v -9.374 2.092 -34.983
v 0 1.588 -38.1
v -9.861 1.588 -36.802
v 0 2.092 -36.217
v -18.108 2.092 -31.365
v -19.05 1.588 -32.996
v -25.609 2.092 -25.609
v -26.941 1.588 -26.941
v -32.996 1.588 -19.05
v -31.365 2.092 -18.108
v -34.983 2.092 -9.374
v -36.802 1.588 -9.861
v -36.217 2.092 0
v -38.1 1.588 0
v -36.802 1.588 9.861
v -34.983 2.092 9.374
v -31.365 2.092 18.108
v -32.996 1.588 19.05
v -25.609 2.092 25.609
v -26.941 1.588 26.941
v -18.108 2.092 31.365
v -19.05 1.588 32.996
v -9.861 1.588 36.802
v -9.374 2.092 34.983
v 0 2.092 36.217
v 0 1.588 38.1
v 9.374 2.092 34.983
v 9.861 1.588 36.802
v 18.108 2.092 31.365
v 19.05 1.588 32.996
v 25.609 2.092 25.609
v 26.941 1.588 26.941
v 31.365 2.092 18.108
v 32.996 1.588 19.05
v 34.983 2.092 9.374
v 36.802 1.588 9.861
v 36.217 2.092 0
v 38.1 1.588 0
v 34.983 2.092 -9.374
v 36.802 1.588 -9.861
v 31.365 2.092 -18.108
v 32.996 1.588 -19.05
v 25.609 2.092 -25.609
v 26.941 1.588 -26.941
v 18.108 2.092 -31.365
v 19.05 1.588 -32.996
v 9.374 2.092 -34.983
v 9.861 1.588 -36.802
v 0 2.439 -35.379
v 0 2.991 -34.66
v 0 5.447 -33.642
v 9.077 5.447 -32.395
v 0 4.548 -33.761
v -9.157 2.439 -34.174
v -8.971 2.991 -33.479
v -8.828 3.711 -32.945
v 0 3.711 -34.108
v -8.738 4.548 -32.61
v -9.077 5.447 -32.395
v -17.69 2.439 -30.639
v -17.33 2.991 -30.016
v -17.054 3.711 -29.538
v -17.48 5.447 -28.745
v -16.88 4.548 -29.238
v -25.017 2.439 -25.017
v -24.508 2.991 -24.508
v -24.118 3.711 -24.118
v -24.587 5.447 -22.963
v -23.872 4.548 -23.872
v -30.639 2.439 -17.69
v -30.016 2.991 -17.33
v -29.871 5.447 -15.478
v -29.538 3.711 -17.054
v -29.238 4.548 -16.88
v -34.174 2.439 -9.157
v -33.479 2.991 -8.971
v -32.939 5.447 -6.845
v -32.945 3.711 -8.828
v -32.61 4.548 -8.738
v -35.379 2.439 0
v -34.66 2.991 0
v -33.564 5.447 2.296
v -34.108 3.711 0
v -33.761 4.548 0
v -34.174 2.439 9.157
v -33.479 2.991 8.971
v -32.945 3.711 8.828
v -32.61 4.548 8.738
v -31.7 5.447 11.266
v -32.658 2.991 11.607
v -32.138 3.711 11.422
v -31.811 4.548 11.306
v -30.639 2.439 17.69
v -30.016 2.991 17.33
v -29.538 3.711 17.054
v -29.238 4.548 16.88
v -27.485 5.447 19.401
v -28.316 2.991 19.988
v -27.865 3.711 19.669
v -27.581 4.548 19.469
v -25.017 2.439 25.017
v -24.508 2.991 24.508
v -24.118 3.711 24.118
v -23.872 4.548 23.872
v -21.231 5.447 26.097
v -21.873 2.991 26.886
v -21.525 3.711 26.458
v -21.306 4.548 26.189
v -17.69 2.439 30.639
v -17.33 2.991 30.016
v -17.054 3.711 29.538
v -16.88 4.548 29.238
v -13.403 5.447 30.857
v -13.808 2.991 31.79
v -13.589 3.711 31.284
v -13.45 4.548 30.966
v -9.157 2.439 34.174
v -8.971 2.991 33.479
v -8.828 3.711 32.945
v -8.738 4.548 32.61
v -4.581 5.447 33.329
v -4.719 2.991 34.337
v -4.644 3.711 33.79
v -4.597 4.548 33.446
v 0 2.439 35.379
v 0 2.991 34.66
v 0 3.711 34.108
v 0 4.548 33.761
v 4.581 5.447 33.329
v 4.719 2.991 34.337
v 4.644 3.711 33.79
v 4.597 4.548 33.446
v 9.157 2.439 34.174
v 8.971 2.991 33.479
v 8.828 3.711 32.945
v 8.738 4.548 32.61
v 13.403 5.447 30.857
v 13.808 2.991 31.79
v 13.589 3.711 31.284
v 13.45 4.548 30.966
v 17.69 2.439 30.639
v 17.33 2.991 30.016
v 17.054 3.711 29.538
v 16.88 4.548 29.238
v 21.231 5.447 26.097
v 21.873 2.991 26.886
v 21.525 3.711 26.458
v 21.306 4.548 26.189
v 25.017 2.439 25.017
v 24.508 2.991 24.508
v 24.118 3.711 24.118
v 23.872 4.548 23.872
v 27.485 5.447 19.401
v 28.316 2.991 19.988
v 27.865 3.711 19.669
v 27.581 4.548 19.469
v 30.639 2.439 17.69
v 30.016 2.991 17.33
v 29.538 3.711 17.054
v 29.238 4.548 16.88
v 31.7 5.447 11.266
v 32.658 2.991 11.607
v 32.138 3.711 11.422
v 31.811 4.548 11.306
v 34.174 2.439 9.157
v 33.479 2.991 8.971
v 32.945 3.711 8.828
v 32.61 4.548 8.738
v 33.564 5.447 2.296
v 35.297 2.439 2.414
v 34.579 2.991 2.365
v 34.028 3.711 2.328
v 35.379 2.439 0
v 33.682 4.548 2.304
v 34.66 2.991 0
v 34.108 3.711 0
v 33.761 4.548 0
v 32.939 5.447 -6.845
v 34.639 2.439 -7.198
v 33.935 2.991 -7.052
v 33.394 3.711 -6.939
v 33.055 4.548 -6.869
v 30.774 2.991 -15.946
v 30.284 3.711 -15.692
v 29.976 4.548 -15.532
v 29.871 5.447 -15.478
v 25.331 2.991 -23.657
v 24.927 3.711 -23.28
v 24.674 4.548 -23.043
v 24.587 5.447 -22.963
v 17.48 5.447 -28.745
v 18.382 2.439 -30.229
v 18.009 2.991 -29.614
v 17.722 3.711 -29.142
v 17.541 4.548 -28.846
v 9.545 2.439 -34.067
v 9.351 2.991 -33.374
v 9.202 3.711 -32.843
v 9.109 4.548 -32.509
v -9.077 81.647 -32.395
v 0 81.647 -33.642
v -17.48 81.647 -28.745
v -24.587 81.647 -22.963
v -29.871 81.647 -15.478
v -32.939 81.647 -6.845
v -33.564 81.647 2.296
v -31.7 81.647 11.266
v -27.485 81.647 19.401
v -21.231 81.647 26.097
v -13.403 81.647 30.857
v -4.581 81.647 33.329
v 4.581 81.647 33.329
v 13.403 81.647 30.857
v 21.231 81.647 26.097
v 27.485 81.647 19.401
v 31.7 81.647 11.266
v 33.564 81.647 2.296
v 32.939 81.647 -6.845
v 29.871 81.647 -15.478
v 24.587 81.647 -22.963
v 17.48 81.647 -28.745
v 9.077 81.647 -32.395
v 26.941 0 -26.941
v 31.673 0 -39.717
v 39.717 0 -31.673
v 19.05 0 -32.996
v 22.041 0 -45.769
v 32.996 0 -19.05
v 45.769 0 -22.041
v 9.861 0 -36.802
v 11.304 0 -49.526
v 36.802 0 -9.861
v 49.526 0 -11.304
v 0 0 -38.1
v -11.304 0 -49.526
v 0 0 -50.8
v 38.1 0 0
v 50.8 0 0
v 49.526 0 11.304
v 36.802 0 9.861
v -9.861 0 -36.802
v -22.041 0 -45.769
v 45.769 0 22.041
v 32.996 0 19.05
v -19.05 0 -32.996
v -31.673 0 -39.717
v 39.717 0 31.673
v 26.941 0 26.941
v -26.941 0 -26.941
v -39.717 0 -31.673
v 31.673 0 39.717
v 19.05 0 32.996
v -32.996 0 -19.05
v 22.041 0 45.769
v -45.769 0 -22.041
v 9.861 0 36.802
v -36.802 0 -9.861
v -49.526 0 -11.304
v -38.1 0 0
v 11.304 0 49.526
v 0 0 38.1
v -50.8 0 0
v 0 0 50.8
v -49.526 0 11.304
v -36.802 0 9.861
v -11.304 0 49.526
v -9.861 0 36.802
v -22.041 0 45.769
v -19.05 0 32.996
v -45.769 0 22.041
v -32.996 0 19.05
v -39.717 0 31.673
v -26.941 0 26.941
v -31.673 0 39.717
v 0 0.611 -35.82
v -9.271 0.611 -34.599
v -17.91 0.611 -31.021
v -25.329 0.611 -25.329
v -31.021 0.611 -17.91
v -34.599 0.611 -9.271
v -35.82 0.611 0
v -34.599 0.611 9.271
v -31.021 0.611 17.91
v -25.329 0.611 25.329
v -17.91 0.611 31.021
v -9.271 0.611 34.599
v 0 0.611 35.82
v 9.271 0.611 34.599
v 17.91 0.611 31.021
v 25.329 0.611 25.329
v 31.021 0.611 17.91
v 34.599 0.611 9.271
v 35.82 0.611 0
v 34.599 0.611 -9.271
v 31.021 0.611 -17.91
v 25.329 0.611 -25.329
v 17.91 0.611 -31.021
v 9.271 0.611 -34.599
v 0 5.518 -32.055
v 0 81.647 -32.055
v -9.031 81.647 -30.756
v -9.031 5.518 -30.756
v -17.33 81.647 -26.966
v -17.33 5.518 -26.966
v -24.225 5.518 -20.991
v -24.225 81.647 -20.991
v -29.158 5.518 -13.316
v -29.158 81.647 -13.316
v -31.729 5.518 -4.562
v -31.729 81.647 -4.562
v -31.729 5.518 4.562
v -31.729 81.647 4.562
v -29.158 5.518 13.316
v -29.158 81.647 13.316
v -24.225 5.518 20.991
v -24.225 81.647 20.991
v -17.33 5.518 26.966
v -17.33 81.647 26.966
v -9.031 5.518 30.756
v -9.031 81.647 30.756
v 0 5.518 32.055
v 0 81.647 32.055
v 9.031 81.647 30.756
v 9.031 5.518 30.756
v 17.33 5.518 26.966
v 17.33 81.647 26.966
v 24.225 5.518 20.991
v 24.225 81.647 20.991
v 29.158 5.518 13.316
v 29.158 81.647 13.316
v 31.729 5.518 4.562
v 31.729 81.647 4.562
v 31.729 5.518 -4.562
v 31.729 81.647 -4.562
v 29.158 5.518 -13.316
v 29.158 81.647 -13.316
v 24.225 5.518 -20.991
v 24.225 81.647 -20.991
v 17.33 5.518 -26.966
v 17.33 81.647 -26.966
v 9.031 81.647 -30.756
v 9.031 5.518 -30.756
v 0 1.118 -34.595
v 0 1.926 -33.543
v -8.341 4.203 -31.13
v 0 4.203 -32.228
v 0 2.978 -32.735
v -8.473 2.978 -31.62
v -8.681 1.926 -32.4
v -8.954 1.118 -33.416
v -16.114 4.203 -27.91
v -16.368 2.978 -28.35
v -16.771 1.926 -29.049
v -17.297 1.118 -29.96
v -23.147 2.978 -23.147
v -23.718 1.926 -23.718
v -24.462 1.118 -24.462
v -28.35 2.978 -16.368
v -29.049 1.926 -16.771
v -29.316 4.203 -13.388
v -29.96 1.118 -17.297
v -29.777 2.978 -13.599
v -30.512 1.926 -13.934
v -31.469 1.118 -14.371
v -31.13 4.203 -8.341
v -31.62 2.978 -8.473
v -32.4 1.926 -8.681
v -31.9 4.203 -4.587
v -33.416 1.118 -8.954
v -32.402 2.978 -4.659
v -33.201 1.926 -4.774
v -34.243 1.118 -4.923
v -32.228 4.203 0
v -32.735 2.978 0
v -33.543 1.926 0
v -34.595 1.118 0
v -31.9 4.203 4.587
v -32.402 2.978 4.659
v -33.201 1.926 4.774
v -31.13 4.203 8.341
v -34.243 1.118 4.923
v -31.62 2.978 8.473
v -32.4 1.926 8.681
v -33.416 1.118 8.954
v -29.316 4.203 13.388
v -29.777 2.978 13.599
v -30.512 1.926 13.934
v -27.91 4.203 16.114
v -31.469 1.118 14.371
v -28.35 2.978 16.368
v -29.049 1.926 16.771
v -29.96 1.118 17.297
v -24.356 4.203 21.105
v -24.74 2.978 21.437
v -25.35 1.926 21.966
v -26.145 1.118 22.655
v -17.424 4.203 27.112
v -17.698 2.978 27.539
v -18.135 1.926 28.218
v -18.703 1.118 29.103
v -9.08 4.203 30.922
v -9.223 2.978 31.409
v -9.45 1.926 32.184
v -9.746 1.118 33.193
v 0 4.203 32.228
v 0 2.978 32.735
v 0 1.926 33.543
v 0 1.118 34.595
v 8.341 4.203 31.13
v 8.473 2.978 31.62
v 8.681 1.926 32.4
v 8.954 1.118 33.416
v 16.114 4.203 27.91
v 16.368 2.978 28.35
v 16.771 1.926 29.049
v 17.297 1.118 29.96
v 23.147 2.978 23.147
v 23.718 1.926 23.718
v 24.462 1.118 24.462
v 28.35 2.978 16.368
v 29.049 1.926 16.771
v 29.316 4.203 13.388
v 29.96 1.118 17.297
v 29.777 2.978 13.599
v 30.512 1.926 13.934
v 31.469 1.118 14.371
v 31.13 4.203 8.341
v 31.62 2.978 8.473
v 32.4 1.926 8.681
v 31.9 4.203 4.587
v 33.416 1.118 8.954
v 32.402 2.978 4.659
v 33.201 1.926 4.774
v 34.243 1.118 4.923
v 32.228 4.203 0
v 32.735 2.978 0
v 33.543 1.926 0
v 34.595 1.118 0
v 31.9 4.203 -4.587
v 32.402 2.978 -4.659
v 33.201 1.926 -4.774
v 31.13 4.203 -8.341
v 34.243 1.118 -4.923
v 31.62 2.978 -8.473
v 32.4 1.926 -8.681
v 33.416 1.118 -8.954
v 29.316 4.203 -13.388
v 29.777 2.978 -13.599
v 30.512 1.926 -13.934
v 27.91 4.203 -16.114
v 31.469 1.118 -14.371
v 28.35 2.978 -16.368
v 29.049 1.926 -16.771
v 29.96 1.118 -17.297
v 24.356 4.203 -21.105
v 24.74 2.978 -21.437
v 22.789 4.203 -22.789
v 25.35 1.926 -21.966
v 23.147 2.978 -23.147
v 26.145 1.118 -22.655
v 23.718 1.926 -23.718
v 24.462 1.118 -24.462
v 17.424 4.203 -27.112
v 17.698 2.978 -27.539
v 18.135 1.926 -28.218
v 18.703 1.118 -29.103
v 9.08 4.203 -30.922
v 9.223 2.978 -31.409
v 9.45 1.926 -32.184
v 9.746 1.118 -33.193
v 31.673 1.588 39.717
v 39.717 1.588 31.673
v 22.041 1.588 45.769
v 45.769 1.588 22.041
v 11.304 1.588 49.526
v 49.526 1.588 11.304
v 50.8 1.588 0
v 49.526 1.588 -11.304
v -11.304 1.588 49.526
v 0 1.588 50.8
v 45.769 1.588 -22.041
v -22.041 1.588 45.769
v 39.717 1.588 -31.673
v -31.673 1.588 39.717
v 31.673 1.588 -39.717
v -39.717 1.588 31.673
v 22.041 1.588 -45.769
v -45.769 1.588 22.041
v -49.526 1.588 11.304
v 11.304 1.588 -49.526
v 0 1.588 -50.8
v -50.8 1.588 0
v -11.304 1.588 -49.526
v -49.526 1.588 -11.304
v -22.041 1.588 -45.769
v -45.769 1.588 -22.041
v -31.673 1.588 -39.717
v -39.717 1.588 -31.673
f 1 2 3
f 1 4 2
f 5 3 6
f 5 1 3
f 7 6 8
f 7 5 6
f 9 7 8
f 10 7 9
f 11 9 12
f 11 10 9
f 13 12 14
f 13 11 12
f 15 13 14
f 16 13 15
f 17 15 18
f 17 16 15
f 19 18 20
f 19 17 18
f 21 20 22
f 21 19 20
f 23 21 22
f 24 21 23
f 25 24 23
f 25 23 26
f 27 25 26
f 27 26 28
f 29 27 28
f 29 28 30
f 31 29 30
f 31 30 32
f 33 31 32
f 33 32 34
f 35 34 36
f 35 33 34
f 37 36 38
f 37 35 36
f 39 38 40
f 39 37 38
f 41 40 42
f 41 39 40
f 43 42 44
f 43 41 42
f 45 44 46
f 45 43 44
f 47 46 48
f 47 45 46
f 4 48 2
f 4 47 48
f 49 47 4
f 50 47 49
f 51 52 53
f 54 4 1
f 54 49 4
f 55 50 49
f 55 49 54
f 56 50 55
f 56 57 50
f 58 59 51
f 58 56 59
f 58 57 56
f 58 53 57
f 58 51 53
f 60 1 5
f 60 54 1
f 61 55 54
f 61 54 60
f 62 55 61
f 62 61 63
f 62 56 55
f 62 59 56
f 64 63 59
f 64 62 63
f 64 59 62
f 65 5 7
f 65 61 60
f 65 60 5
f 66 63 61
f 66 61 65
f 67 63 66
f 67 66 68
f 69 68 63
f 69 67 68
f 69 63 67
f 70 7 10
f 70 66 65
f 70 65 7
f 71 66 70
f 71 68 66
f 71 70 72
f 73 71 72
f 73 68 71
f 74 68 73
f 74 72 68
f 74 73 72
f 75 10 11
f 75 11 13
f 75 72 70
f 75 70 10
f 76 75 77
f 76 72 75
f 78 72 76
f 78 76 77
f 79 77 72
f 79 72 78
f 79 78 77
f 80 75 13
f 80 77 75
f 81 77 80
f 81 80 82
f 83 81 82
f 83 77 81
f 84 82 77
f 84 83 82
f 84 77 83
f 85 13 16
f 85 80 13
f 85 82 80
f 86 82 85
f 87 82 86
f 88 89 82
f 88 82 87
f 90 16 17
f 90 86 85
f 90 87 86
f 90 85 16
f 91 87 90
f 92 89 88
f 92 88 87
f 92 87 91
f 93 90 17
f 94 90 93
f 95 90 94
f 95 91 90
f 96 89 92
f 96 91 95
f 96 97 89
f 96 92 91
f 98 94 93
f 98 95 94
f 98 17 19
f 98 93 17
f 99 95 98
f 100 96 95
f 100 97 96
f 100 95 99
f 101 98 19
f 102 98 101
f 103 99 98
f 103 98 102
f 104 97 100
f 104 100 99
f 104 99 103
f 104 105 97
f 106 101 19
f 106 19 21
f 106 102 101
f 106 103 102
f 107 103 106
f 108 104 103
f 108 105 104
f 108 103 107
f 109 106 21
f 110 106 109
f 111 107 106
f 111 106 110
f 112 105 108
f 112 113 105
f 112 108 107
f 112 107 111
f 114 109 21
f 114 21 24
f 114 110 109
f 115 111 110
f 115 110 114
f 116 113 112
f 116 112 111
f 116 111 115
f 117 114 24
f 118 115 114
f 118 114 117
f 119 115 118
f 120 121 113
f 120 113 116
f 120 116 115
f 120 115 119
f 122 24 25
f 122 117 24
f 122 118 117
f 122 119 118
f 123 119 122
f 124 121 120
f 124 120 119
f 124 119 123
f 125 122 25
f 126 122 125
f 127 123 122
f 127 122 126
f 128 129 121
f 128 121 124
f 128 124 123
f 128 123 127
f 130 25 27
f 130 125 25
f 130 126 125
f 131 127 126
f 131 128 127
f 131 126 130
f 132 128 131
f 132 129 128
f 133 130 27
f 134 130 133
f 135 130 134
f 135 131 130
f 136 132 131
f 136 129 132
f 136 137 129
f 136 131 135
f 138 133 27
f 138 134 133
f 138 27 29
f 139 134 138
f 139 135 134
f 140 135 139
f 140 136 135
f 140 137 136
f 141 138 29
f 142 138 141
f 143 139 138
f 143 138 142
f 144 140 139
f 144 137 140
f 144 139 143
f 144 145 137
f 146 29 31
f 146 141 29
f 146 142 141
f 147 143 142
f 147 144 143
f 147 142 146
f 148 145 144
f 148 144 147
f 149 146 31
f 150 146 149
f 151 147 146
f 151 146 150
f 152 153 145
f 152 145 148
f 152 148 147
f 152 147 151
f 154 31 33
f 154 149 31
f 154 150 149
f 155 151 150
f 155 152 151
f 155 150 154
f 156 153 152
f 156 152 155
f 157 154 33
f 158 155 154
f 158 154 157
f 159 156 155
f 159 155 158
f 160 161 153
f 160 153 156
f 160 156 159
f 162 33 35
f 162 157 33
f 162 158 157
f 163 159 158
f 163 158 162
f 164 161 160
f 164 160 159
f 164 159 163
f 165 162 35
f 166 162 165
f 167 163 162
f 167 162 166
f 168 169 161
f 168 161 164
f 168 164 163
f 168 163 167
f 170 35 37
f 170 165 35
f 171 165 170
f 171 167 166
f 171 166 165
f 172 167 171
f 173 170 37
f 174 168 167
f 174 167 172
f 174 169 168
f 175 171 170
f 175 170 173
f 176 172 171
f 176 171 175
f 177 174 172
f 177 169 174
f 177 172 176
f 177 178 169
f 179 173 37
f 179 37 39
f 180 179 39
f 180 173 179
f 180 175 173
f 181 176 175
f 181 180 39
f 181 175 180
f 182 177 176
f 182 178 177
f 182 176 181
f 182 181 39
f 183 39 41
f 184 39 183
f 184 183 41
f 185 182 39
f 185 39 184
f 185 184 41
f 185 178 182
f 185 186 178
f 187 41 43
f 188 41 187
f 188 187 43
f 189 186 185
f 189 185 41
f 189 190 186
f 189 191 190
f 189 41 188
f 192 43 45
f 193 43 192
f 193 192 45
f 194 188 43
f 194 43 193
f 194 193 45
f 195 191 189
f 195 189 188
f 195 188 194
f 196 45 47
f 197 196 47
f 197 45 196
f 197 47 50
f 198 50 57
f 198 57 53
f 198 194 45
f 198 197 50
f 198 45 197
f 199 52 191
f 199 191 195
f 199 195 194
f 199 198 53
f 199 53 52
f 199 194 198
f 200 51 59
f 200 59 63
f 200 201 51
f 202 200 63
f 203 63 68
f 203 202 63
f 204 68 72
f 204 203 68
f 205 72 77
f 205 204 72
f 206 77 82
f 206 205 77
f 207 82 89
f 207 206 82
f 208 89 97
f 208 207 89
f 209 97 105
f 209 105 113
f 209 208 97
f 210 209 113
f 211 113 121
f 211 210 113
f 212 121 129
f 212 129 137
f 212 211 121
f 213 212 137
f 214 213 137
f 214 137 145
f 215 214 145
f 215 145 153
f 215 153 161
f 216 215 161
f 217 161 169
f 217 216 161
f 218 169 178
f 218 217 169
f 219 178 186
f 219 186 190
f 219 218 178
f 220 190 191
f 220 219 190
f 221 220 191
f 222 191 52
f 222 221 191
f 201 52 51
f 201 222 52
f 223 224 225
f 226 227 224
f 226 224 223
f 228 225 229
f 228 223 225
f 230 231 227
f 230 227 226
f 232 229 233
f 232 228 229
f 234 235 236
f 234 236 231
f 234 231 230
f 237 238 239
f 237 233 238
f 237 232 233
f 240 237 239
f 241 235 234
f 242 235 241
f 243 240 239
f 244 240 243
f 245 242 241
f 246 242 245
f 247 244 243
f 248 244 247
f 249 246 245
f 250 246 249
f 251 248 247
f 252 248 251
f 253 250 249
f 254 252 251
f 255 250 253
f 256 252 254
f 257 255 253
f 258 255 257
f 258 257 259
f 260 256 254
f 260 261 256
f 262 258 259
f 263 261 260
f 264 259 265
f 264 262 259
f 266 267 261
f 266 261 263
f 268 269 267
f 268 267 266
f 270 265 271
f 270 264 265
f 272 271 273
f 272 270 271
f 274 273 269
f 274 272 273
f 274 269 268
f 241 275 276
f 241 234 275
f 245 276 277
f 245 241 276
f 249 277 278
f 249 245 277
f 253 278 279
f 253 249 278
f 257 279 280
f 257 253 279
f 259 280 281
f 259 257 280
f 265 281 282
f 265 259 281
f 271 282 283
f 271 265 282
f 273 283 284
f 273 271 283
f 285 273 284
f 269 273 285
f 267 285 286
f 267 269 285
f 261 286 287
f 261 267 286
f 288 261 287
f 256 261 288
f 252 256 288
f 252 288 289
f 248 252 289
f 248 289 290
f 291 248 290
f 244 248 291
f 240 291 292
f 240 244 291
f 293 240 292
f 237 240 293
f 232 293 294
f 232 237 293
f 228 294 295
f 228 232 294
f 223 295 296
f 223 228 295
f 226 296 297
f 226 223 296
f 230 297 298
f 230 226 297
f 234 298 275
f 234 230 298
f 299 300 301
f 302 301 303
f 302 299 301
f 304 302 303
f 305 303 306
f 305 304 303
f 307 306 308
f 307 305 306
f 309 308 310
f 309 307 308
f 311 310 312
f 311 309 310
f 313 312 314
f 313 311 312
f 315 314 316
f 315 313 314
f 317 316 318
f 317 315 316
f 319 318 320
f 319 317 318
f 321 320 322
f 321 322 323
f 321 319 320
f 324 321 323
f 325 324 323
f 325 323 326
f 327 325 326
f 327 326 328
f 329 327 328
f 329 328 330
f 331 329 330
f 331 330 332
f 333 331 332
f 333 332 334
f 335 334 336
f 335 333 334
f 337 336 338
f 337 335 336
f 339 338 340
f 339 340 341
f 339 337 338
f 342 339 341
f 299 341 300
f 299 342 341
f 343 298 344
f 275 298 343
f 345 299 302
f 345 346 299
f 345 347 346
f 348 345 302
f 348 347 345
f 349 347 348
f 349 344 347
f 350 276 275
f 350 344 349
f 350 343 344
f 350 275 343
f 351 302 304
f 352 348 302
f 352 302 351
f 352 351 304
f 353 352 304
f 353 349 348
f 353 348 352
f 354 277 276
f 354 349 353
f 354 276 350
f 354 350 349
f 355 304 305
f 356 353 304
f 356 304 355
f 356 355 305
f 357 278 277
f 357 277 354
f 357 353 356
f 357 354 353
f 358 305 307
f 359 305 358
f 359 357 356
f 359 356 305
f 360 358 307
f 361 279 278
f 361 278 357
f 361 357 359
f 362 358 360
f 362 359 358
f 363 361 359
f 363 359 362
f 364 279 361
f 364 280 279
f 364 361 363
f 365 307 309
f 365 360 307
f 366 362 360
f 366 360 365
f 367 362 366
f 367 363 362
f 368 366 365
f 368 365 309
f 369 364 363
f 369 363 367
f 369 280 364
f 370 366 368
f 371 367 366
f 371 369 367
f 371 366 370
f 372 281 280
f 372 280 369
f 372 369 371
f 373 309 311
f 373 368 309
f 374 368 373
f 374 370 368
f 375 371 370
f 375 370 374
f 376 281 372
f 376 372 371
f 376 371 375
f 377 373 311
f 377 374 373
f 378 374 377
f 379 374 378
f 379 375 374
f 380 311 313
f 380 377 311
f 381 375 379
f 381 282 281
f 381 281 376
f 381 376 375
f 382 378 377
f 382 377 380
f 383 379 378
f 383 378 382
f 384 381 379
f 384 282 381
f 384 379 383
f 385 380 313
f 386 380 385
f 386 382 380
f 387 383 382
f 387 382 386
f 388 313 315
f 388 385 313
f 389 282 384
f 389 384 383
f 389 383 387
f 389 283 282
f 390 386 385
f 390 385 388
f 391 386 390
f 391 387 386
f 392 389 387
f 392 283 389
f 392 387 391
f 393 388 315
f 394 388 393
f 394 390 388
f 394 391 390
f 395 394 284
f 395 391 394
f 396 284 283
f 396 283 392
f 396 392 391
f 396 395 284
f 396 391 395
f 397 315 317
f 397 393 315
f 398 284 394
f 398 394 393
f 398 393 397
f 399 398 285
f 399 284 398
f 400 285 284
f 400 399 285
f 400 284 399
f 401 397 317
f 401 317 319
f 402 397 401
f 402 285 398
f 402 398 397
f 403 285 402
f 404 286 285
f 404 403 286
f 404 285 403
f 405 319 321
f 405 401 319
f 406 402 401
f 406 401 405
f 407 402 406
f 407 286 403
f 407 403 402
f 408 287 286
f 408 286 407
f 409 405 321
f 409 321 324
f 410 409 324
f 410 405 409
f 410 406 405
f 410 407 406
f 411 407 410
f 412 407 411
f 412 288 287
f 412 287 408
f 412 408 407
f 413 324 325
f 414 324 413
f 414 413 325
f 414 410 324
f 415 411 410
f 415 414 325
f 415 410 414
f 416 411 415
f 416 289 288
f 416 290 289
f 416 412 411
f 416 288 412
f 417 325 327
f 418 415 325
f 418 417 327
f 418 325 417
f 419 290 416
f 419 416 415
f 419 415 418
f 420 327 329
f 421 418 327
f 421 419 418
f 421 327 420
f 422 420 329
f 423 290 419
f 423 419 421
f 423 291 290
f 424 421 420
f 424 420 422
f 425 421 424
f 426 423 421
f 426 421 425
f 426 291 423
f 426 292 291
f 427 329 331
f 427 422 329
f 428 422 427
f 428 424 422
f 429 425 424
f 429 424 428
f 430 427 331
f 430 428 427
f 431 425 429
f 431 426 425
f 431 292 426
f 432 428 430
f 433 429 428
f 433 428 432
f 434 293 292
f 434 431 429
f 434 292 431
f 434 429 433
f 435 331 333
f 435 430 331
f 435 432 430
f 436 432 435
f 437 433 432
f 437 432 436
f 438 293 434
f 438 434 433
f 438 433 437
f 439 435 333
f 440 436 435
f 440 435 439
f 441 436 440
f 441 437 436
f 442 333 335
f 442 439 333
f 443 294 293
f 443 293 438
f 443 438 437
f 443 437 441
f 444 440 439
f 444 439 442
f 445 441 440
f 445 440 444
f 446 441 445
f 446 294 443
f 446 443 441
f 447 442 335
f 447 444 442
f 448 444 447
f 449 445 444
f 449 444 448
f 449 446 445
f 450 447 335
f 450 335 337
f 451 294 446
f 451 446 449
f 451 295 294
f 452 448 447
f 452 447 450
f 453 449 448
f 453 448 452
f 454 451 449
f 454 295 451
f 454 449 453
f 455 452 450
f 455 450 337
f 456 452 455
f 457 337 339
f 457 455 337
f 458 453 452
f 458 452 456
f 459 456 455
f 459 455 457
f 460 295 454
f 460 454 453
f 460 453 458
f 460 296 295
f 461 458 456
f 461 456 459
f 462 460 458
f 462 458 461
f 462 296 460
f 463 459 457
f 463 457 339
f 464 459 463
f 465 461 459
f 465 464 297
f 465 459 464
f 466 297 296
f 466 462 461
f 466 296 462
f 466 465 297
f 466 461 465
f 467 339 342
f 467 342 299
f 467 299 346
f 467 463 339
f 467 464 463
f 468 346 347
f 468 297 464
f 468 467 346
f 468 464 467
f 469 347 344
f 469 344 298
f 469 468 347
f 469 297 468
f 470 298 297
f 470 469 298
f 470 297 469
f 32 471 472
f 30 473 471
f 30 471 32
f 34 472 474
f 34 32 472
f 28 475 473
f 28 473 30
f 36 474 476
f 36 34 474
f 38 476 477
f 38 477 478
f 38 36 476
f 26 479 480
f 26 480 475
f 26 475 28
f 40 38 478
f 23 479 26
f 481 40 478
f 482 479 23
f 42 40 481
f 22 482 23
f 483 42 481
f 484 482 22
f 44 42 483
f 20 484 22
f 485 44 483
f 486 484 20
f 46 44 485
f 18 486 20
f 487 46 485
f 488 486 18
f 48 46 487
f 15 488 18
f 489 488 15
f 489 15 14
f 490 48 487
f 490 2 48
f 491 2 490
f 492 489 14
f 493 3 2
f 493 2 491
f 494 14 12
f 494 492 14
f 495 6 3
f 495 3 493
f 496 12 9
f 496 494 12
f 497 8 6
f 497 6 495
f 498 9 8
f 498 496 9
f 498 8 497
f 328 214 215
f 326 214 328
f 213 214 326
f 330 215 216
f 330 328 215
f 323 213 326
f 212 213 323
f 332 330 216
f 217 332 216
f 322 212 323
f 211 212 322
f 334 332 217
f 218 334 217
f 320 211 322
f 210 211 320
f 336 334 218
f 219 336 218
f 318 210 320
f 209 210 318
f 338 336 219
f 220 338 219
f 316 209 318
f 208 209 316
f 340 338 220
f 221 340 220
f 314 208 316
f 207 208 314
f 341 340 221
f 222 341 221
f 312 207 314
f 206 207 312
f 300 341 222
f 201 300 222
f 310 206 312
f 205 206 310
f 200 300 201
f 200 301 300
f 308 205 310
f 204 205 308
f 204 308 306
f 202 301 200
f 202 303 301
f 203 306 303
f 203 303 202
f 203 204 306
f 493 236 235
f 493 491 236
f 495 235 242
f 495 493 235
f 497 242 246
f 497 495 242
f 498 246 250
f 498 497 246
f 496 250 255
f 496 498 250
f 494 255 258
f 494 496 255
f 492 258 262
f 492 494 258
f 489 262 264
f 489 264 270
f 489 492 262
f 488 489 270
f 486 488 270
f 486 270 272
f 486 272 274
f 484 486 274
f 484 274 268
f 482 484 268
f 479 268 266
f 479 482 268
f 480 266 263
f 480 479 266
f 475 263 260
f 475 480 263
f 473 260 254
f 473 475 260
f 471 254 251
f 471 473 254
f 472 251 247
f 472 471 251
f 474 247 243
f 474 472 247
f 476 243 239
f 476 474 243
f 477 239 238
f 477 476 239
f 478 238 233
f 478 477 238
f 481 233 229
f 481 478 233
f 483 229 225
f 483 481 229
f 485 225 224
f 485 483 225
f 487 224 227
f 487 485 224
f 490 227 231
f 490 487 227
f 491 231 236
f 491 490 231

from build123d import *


with BuildPart() as part:
    # Sketch2 → Revolve1 (revolve)
    with BuildSketch(Plane.XY, mode=Mode.PRIVATE) as revolve1_sk:
        with BuildLine():
            Line((38.1, 0), (50.8, 0))
            Line((50.8, 0), (50.8, 1.5875))
            Line((50.8, 1.5875), (38.1, 1.5875))
            Line((38.1, 1.5875), (36.216874251, 2.092082024))
            ThreePointArc((36.216874251, 2.092082024), (34.360110092, 3.332732171), (33.6423, 5.447332512))
            Line((33.6423, 5.447332512), (33.6423, 81.647332512))
            Line((33.6423, 81.647332512), (32.0548, 81.647332512))
            Line((32.0548, 81.647332512), (32.0548, 5.517827557))
            ThreePointArc((32.0548, 5.517827557), (33.104565031, 2.425319498), (35.819999251, 0.610924359))
            Line((35.819999251, 0.610924359), (38.1, 0))
        make_face()
    revolve(revolve1_sk.sketch.rotate(Axis((0, 0, 0), (0, 1, 0)), 90), axis=Axis((0, 0, 0), (0, 1, 0)))


solid = part.part
